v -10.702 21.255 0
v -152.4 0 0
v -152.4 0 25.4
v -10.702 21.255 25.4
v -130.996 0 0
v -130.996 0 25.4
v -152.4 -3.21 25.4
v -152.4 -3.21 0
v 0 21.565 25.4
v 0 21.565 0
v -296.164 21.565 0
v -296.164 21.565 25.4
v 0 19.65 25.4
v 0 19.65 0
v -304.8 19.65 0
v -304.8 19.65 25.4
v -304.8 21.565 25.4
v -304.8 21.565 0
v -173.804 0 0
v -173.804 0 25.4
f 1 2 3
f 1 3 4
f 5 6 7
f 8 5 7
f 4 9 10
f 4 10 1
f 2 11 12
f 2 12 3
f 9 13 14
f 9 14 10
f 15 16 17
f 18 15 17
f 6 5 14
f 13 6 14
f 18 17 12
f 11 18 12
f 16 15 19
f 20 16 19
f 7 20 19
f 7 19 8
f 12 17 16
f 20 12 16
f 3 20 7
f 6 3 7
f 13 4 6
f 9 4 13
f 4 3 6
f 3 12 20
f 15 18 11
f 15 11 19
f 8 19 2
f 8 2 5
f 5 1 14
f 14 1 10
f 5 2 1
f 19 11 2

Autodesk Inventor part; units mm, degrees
ref_plane "YZ Plane" through (0, 0, 0) normal (1, 0, 0) x (0, 1, 0)
ref_plane "XZ Plane" through (0, 0, 0) normal (0, 1, 0) x (-1, 0, 0)
ref_plane "XY Plane" through (0, 0, 0) normal (0, 0, 1) x (1, 0, 0)
sketch "Sketch1" plane through (0, 0, 0) normal (0, 0, 1) x (1, 0, 0)
  line L0 (0, 0) -> (0, 22.86)
  line L1 (-304.8, 0) -> (-304.8, 22.86)
  line L2 (-304.8, 22.86) -> (-152.4, 0)
  line L3 (-152.4, 0) -> (0, 22.86)
  line L4 (-304.8, 19.6495) -> (-173.8035, 0)
  line L5 (-130.9965, 0) -> (0, 19.6495)
  line L6 (-173.8035, 0) -> (-152.4, -3.2105)
  line L7 (-130.9965, 0) -> (-152.4, -3.2105)
  line L8 (-304.8, 0) -> (-173.8035, 0)
  line L9 (-130.9965, 0) -> (0, 0)
  line L10 (-152.4, -3.2105) -> (-165.1, -3.2105)
  line L11 (-165.1, -3.2105) -> (-165.1, -1.3055)
  dimension "d0" = 22.86
  dimension "d2" = 304.8
  dimension "d4" = 3.175
  dimension "d5" = 3.175
  dimension "d8" = 12.7
extrude "Extrusion1" add sketch "Sketch1" along normal blind 25.4 contours L5 L7 L6 L4 L1 L2 L3 L0
sketch "Sketch2" plane through (0, 0, 25.4) normal (0, 0, 1) x (1, 0, 0)
  line L0 (0, 19.6495) -> (0, 22.86) projected
  line L1 (0, 22.86) -> (-152.4, 0) projected
  line L2 (-152.4, 0) -> (-304.8, 22.86) projected
  line L3 (-304.8, 22.86) -> (-304.8, 19.6495) projected
  line L4 (-304.8, 22.86) -> (-304.8, 21.5646)
  line L5 (-304.8, 21.5646) -> (-296.164, 21.5646)
  line L6 (0, 22.86) -> (0, 21.5646)
  line L7 (0, 21.5646) -> (-10.7017, 21.2547)
  point P0 (0, 0)
  dimension "d9" = 1.2954
  dimension "d10" = 1.2954
extrude "Extrusion2" cut sketch "Sketch2" against normal blind 50.8
properties part number "plough"
